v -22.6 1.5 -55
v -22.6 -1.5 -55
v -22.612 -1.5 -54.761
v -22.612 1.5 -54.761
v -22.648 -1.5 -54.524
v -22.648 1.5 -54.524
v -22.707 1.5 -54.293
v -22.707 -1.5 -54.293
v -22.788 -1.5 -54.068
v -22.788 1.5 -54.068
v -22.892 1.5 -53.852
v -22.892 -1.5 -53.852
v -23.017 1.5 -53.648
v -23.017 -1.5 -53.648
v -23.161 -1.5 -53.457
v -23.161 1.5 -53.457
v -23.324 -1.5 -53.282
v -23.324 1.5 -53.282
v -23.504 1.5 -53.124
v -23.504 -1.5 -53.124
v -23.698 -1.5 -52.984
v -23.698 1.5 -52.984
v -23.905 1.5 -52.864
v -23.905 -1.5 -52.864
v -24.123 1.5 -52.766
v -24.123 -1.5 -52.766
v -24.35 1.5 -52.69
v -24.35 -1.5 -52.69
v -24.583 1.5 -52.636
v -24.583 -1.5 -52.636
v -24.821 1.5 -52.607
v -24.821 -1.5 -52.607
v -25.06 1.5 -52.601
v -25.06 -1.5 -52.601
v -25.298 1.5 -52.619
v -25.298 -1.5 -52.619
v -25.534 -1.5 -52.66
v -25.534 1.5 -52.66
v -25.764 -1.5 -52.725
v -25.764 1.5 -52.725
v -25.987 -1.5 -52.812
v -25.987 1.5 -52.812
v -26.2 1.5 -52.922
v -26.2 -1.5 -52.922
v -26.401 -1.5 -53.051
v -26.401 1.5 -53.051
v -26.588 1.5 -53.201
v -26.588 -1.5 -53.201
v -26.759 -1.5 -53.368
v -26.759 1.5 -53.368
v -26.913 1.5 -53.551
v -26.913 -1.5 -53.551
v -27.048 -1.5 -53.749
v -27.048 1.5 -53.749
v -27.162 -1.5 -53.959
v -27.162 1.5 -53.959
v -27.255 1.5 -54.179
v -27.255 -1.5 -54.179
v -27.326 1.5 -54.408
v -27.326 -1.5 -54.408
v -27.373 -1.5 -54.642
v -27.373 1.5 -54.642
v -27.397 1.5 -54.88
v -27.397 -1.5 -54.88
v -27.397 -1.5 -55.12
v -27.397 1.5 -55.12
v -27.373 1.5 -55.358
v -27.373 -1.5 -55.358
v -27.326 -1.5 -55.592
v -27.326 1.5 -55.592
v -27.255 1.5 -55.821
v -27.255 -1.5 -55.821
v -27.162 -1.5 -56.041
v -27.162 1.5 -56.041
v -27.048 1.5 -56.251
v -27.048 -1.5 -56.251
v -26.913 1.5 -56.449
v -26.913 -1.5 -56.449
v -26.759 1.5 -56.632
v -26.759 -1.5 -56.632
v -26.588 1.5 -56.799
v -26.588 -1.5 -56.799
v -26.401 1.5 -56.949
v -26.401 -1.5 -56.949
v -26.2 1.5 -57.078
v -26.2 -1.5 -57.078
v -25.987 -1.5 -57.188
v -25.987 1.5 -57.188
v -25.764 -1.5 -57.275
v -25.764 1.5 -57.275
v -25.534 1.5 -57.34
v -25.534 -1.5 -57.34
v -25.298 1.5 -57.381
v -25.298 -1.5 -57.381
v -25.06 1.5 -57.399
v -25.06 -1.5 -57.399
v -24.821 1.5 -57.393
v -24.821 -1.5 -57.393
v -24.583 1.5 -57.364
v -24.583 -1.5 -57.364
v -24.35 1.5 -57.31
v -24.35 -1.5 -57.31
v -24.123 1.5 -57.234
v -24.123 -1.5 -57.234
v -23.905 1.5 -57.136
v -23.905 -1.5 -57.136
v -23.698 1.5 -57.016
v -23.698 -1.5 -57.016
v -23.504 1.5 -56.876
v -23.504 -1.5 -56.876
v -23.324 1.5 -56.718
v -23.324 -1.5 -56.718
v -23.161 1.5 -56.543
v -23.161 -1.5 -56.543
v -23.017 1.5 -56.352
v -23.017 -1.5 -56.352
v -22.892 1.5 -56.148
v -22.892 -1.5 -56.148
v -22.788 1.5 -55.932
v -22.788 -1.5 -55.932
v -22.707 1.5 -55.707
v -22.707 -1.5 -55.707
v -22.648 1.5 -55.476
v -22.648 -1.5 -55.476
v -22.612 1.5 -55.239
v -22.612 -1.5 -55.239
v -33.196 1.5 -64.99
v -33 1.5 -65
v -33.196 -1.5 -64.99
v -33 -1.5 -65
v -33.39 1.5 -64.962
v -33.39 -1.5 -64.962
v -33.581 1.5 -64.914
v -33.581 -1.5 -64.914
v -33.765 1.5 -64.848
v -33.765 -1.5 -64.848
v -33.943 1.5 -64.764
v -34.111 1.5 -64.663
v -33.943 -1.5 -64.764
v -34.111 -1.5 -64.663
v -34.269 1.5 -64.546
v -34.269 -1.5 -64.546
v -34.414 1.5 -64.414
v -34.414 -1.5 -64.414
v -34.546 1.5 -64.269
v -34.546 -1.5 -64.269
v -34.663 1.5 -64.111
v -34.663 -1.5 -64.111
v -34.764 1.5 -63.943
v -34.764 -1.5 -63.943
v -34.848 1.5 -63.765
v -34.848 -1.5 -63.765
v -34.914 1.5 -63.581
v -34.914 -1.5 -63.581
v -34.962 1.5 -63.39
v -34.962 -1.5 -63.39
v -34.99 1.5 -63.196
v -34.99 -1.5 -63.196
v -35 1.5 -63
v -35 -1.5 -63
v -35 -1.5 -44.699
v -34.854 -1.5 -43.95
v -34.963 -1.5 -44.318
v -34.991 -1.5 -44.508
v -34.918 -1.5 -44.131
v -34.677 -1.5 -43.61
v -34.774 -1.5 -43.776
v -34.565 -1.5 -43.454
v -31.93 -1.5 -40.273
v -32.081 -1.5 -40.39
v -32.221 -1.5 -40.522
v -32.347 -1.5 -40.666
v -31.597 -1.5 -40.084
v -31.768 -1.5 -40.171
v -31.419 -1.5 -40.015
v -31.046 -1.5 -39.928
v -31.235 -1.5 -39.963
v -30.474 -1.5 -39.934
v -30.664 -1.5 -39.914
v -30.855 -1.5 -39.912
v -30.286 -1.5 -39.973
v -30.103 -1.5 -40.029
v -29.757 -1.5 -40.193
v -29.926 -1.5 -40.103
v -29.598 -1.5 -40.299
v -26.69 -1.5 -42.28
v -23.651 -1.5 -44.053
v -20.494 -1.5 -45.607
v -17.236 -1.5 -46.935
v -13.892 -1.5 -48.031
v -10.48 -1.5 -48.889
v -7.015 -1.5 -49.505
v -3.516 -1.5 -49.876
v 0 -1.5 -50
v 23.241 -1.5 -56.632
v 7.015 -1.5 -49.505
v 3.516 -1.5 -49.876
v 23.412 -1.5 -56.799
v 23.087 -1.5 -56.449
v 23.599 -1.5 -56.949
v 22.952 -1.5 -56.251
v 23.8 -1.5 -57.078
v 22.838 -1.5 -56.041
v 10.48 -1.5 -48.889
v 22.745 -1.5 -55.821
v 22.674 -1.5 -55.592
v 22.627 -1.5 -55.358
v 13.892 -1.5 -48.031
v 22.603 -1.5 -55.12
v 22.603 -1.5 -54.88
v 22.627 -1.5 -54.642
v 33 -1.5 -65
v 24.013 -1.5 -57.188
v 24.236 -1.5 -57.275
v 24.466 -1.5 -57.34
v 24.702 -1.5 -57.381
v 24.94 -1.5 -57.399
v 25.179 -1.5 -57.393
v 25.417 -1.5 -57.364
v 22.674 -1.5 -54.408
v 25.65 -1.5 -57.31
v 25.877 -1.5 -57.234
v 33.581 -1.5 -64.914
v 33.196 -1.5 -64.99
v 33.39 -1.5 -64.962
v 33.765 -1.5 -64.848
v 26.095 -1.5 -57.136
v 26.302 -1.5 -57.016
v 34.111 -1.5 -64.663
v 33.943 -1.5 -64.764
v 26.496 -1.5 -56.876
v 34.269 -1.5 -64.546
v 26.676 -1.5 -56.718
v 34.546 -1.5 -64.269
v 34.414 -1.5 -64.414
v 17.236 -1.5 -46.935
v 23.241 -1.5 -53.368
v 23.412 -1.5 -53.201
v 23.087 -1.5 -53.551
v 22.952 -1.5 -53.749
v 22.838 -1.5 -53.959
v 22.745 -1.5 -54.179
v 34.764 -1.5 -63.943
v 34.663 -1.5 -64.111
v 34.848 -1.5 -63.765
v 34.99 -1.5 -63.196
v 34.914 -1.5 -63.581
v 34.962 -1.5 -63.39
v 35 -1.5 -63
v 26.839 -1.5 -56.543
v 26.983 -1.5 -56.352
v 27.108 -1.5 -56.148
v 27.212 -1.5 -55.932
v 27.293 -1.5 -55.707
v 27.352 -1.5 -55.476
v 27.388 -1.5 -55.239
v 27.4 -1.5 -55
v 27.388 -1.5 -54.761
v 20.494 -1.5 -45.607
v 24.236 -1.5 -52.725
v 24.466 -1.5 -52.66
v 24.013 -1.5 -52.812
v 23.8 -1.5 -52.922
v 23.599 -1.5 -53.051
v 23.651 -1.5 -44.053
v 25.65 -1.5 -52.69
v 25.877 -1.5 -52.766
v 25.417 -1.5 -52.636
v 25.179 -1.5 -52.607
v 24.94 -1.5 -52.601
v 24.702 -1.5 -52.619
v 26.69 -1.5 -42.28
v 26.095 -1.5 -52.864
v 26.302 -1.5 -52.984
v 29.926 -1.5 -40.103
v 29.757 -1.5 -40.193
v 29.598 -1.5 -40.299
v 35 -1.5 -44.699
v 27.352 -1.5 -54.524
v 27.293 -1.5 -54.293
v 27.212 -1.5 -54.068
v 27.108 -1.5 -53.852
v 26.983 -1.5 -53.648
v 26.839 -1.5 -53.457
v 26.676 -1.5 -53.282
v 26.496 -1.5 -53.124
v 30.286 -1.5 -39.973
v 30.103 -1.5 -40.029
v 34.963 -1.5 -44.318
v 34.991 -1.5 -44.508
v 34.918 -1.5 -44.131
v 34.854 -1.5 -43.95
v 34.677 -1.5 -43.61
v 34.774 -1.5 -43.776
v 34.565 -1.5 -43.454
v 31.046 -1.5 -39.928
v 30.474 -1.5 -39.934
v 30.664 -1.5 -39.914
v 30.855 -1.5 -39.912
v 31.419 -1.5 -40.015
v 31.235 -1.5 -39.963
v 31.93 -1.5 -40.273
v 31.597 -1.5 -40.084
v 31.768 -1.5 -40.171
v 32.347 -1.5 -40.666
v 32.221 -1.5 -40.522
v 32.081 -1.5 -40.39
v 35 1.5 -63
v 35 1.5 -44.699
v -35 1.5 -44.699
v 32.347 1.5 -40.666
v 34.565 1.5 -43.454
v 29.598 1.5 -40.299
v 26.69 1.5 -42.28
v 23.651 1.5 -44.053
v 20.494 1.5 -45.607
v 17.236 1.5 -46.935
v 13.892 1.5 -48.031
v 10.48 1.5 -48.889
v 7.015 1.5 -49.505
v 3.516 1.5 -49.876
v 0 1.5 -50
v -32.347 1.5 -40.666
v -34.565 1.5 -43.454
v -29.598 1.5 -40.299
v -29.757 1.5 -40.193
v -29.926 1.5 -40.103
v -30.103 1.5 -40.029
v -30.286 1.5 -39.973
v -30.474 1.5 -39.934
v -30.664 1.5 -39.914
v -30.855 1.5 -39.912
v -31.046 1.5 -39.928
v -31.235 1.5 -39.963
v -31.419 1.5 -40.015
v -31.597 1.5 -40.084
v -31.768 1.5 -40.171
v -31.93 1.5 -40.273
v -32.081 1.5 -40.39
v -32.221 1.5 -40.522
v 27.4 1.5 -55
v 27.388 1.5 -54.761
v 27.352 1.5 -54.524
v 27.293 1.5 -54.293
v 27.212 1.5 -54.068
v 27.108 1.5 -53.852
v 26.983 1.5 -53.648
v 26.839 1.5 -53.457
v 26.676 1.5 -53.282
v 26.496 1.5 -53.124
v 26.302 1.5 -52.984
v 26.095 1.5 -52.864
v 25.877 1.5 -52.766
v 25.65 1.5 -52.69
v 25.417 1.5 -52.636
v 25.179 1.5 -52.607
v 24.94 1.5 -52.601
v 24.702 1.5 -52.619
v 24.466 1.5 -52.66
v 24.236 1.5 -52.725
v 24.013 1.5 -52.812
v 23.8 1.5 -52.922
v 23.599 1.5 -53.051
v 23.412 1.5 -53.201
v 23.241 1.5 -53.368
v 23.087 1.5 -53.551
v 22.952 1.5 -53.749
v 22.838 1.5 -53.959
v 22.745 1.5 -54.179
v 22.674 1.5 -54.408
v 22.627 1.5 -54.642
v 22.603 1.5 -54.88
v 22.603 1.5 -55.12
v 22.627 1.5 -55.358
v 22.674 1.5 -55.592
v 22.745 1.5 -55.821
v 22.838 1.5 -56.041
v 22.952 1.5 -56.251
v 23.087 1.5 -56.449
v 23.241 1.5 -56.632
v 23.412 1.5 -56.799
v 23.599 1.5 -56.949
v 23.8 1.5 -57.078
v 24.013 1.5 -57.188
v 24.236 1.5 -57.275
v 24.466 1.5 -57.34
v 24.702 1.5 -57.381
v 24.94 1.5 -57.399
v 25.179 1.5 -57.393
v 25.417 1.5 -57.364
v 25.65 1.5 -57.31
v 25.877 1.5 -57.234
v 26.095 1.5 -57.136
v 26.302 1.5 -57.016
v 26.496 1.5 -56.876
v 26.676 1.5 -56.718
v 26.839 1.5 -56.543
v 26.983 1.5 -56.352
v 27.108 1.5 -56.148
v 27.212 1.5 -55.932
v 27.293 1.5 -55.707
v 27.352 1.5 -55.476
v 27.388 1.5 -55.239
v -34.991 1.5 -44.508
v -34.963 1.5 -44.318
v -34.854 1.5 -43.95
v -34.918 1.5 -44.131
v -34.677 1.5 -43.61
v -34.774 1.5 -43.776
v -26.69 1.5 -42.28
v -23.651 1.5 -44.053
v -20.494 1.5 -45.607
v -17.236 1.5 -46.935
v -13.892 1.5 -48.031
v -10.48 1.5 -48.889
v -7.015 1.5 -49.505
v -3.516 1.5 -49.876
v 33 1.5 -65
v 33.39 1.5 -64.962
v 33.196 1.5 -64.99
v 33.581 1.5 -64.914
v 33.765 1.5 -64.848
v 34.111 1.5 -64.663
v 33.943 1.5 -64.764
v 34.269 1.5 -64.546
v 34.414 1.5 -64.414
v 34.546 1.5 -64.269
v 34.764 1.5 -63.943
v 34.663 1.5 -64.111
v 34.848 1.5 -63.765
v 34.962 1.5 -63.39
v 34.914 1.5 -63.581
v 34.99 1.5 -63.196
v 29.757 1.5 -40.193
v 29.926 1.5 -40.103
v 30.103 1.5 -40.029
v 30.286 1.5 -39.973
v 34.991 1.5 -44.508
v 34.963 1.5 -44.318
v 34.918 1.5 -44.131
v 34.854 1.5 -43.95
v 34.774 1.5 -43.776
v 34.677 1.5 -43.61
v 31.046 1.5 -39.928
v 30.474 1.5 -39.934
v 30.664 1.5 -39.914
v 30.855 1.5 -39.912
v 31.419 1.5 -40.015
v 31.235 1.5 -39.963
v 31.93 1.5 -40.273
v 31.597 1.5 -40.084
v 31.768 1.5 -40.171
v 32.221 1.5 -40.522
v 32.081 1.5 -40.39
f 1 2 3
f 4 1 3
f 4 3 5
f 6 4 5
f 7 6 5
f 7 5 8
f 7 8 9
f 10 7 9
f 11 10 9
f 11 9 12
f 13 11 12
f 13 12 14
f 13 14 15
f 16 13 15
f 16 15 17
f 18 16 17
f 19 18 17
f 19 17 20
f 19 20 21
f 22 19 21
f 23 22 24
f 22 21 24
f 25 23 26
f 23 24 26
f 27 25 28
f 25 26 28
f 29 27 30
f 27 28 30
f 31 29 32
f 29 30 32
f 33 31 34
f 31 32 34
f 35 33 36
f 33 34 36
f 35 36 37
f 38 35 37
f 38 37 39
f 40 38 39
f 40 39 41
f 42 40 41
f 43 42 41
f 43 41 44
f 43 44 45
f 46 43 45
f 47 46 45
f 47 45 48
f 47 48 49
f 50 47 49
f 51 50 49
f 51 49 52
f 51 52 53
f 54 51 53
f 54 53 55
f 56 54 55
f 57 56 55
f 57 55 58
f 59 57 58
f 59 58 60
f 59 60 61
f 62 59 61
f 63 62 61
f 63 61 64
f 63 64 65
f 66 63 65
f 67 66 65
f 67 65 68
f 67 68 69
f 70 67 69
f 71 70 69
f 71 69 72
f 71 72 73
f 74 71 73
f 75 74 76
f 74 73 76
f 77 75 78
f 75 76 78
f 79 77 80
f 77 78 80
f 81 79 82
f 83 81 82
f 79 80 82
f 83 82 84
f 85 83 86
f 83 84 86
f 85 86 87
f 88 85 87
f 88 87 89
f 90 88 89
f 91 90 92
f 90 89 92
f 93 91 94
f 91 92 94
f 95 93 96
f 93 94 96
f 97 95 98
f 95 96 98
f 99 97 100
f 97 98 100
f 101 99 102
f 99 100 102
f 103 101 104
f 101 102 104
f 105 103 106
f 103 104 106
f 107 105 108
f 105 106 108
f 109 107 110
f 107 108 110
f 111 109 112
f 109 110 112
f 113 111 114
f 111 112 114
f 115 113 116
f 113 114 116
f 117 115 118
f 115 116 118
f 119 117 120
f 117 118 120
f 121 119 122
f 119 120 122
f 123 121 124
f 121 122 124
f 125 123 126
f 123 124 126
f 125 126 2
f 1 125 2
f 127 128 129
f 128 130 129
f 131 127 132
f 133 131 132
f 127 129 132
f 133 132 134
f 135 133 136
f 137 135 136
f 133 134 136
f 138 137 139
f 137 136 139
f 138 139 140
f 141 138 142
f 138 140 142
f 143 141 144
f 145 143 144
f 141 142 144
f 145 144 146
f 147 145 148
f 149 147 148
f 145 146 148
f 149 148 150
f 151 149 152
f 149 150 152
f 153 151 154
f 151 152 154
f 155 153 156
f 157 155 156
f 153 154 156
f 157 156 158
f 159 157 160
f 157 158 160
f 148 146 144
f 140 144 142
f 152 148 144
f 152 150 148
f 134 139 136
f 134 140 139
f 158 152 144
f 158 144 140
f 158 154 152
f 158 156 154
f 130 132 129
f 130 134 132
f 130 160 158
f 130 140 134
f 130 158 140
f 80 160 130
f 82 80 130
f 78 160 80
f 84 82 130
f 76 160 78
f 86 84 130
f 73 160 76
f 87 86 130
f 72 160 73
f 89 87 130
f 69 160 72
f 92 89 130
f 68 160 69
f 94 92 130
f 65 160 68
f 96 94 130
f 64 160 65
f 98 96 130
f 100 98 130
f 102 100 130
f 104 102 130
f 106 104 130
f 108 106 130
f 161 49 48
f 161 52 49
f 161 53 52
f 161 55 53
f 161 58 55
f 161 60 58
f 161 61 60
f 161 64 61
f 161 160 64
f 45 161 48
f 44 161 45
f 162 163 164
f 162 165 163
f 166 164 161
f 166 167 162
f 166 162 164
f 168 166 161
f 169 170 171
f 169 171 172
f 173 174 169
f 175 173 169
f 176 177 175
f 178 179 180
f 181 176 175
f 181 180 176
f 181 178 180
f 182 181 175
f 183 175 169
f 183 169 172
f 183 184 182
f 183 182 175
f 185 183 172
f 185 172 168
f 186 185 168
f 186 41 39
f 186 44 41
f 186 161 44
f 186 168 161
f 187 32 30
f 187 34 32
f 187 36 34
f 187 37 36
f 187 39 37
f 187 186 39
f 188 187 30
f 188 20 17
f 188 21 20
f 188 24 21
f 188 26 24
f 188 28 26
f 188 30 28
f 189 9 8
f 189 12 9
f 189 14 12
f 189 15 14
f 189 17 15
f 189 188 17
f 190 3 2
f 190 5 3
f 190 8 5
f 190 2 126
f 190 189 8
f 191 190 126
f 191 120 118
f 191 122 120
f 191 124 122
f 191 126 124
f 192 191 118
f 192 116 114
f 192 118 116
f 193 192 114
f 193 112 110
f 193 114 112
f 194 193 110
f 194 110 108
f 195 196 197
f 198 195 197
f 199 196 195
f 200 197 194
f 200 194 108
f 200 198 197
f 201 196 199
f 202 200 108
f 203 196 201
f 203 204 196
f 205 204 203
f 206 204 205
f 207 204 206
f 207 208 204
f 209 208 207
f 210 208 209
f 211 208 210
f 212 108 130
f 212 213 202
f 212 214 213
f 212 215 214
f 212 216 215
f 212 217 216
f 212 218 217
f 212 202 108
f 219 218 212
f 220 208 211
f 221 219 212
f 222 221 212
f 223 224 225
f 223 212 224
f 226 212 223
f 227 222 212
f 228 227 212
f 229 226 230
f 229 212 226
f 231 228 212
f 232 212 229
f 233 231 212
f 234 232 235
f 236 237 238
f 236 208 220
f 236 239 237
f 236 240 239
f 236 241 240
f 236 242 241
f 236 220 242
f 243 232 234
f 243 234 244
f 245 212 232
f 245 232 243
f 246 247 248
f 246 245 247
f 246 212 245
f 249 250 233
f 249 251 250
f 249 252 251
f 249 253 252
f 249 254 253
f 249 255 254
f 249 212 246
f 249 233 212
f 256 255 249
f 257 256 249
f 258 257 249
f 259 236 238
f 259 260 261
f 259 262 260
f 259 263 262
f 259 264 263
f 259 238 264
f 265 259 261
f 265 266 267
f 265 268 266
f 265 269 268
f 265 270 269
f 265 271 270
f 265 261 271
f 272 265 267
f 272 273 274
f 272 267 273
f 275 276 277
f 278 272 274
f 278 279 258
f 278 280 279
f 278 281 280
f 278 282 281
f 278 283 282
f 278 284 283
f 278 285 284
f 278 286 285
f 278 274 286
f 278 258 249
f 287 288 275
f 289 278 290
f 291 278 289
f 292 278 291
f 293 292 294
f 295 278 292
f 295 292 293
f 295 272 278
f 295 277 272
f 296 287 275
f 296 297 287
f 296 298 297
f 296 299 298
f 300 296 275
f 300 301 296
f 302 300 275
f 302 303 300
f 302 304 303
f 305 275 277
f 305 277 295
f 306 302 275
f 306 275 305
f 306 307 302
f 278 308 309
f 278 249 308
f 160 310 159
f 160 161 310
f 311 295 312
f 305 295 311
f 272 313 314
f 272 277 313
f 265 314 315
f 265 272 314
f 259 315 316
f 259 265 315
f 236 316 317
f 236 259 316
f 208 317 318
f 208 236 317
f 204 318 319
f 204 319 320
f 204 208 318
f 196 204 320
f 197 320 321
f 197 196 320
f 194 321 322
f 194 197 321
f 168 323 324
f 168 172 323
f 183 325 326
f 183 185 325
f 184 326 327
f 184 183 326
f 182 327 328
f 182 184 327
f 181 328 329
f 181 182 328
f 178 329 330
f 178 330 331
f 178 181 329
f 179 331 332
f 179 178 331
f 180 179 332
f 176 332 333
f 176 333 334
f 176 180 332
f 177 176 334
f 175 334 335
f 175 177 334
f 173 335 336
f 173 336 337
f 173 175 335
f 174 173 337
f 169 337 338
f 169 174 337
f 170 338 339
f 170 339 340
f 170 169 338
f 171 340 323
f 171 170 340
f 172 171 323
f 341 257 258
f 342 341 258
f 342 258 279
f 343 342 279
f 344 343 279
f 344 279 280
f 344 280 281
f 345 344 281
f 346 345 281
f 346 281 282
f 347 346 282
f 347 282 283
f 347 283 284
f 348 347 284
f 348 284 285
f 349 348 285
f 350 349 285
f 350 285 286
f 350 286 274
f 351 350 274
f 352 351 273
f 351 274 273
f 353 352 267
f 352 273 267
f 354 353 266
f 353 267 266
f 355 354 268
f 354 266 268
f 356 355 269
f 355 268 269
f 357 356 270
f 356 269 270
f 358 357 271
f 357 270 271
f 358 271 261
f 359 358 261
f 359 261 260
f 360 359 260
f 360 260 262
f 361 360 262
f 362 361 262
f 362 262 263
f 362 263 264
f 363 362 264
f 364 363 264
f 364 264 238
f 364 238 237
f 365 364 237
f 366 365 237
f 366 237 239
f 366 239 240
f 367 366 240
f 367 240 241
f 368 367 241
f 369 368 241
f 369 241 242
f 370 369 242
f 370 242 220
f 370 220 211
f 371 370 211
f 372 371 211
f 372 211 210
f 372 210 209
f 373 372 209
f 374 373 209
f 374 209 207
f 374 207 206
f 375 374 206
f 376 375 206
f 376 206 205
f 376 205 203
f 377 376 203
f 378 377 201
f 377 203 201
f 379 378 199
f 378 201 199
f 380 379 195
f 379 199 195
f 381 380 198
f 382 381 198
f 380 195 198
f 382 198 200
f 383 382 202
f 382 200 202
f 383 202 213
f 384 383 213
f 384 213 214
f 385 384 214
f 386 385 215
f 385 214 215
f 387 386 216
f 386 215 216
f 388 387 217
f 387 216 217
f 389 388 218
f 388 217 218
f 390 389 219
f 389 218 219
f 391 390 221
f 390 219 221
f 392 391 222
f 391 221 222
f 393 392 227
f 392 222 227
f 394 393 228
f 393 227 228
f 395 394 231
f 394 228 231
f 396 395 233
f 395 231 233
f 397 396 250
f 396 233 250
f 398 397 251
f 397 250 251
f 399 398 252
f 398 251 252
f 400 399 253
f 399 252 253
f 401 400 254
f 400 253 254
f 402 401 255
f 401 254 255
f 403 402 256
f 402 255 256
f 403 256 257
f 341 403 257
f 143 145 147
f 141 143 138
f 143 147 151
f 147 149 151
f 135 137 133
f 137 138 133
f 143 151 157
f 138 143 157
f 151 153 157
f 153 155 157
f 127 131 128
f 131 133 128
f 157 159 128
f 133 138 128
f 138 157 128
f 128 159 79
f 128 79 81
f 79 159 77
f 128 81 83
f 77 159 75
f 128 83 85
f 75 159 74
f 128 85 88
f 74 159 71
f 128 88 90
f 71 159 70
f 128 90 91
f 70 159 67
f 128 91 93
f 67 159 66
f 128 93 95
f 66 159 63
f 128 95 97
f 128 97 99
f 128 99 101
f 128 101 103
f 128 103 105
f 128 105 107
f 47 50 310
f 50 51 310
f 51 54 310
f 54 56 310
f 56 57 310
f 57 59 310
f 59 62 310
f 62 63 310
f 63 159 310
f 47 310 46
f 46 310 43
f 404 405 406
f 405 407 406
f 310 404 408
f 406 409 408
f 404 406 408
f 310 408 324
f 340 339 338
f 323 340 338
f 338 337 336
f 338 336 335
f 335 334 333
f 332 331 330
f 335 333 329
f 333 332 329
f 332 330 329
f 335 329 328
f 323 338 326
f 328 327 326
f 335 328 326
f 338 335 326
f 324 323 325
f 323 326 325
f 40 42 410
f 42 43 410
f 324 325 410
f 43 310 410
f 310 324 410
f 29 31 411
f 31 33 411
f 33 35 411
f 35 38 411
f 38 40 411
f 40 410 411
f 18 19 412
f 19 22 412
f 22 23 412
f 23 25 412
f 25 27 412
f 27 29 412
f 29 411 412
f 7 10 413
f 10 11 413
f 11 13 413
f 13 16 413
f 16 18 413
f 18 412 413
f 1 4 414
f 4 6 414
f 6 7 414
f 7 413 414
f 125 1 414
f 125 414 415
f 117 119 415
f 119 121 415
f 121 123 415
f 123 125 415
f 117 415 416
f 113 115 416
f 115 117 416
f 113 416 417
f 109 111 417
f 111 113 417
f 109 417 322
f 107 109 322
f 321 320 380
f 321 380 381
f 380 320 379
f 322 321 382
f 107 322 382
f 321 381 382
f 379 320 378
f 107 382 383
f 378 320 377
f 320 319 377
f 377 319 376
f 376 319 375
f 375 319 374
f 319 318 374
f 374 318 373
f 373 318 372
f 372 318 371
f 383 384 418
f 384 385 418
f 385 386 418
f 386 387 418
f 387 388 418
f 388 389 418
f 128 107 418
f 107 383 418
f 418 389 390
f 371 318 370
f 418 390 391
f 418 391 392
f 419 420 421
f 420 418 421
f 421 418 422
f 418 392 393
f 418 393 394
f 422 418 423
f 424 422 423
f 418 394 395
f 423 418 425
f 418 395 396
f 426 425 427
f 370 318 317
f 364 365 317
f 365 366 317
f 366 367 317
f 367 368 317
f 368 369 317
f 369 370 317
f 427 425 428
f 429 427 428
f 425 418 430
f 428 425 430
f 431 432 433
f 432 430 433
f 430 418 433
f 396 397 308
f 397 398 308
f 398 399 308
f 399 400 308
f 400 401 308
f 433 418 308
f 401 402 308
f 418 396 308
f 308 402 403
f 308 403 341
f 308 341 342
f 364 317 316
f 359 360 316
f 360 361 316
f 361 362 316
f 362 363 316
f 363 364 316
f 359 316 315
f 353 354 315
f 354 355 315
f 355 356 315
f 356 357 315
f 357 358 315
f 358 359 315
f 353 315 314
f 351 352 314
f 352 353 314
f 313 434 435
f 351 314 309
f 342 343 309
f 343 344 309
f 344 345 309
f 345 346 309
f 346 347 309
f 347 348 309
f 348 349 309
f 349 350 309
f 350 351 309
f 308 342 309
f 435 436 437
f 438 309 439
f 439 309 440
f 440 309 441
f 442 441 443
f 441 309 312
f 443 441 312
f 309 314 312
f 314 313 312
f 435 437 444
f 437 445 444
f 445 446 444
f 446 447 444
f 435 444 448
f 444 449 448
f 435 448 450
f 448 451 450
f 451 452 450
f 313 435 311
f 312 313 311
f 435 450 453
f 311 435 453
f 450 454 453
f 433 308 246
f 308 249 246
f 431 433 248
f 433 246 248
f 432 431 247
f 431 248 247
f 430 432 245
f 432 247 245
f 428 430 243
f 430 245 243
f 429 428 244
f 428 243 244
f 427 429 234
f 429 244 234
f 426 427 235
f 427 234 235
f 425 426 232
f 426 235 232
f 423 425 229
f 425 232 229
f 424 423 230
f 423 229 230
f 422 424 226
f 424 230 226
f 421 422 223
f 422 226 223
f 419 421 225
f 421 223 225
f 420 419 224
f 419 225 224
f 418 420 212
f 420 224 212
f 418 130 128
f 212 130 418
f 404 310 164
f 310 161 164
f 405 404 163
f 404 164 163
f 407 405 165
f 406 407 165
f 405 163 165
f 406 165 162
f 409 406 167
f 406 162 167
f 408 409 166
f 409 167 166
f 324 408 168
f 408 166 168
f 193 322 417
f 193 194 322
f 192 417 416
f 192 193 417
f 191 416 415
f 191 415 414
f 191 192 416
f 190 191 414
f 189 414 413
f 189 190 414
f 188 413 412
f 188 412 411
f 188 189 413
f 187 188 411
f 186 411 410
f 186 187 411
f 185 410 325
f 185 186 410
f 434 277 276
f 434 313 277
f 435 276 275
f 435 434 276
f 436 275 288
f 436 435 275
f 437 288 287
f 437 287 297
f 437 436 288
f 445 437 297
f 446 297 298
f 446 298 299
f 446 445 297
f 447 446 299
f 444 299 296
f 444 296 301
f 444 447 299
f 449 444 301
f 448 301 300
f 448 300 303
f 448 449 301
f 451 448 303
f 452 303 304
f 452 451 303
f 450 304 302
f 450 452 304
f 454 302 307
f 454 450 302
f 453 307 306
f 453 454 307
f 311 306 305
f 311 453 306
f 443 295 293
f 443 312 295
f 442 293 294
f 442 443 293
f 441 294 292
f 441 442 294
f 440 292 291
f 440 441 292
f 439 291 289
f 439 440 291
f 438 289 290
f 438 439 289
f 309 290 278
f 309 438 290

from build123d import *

# Parameters (mm, degrees)
F1_DEPTH = 1.5
F2_R     = 2
F3_R     = 2.4
F4_DEPTH = 25


with BuildPart() as f1:
    # F0 (on Front) → F1 (new body, symmetric)
    with BuildSketch(Plane.XZ):
        with BuildLine():
            ThreePointArc((0, -50), (-16.484532, -47.204451), (-31.125732, -39.130408))
            Line((-31.125732, -39.130408), (-35, -44.00103))
            Line((-35, -44.00103), (-35, -65))
            Line((-35, -65), (35, -65))
            Line((35, -65), (35, -44.00103))
            Line((35, -44.00103), (31.125732, -39.130408))
            ThreePointArc((31.125732, -39.130408), (16.484532, -47.204451), (0, -50))
        make_face()
    extrude(amount=F1_DEPTH, both=True)

    # F2
    f2_edges = [f1.edges().sort_by_distance(p)[0] for p in [
        (31.125732, 0, -39.130408),
        (35, 0, -44.00103),
        (35, 0, -65),
        (-31.125732, 0, -39.130408),
        (-35, 0, -44.00103),
        (-35, 0, -65),
    ]]
    fillet(f2_edges, radius=F2_R)

    # F3 (on face) → F4 (cut)
    with BuildSketch(Plane.XZ.offset(1.5)):
        with Locations((-25, -55)):
            Circle(F3_R)
        with Locations((25, -55)):
            Circle(F3_R)
    extrude(amount=-F4_DEPTH, mode=Mode.SUBTRACT)


solid = f1.part
